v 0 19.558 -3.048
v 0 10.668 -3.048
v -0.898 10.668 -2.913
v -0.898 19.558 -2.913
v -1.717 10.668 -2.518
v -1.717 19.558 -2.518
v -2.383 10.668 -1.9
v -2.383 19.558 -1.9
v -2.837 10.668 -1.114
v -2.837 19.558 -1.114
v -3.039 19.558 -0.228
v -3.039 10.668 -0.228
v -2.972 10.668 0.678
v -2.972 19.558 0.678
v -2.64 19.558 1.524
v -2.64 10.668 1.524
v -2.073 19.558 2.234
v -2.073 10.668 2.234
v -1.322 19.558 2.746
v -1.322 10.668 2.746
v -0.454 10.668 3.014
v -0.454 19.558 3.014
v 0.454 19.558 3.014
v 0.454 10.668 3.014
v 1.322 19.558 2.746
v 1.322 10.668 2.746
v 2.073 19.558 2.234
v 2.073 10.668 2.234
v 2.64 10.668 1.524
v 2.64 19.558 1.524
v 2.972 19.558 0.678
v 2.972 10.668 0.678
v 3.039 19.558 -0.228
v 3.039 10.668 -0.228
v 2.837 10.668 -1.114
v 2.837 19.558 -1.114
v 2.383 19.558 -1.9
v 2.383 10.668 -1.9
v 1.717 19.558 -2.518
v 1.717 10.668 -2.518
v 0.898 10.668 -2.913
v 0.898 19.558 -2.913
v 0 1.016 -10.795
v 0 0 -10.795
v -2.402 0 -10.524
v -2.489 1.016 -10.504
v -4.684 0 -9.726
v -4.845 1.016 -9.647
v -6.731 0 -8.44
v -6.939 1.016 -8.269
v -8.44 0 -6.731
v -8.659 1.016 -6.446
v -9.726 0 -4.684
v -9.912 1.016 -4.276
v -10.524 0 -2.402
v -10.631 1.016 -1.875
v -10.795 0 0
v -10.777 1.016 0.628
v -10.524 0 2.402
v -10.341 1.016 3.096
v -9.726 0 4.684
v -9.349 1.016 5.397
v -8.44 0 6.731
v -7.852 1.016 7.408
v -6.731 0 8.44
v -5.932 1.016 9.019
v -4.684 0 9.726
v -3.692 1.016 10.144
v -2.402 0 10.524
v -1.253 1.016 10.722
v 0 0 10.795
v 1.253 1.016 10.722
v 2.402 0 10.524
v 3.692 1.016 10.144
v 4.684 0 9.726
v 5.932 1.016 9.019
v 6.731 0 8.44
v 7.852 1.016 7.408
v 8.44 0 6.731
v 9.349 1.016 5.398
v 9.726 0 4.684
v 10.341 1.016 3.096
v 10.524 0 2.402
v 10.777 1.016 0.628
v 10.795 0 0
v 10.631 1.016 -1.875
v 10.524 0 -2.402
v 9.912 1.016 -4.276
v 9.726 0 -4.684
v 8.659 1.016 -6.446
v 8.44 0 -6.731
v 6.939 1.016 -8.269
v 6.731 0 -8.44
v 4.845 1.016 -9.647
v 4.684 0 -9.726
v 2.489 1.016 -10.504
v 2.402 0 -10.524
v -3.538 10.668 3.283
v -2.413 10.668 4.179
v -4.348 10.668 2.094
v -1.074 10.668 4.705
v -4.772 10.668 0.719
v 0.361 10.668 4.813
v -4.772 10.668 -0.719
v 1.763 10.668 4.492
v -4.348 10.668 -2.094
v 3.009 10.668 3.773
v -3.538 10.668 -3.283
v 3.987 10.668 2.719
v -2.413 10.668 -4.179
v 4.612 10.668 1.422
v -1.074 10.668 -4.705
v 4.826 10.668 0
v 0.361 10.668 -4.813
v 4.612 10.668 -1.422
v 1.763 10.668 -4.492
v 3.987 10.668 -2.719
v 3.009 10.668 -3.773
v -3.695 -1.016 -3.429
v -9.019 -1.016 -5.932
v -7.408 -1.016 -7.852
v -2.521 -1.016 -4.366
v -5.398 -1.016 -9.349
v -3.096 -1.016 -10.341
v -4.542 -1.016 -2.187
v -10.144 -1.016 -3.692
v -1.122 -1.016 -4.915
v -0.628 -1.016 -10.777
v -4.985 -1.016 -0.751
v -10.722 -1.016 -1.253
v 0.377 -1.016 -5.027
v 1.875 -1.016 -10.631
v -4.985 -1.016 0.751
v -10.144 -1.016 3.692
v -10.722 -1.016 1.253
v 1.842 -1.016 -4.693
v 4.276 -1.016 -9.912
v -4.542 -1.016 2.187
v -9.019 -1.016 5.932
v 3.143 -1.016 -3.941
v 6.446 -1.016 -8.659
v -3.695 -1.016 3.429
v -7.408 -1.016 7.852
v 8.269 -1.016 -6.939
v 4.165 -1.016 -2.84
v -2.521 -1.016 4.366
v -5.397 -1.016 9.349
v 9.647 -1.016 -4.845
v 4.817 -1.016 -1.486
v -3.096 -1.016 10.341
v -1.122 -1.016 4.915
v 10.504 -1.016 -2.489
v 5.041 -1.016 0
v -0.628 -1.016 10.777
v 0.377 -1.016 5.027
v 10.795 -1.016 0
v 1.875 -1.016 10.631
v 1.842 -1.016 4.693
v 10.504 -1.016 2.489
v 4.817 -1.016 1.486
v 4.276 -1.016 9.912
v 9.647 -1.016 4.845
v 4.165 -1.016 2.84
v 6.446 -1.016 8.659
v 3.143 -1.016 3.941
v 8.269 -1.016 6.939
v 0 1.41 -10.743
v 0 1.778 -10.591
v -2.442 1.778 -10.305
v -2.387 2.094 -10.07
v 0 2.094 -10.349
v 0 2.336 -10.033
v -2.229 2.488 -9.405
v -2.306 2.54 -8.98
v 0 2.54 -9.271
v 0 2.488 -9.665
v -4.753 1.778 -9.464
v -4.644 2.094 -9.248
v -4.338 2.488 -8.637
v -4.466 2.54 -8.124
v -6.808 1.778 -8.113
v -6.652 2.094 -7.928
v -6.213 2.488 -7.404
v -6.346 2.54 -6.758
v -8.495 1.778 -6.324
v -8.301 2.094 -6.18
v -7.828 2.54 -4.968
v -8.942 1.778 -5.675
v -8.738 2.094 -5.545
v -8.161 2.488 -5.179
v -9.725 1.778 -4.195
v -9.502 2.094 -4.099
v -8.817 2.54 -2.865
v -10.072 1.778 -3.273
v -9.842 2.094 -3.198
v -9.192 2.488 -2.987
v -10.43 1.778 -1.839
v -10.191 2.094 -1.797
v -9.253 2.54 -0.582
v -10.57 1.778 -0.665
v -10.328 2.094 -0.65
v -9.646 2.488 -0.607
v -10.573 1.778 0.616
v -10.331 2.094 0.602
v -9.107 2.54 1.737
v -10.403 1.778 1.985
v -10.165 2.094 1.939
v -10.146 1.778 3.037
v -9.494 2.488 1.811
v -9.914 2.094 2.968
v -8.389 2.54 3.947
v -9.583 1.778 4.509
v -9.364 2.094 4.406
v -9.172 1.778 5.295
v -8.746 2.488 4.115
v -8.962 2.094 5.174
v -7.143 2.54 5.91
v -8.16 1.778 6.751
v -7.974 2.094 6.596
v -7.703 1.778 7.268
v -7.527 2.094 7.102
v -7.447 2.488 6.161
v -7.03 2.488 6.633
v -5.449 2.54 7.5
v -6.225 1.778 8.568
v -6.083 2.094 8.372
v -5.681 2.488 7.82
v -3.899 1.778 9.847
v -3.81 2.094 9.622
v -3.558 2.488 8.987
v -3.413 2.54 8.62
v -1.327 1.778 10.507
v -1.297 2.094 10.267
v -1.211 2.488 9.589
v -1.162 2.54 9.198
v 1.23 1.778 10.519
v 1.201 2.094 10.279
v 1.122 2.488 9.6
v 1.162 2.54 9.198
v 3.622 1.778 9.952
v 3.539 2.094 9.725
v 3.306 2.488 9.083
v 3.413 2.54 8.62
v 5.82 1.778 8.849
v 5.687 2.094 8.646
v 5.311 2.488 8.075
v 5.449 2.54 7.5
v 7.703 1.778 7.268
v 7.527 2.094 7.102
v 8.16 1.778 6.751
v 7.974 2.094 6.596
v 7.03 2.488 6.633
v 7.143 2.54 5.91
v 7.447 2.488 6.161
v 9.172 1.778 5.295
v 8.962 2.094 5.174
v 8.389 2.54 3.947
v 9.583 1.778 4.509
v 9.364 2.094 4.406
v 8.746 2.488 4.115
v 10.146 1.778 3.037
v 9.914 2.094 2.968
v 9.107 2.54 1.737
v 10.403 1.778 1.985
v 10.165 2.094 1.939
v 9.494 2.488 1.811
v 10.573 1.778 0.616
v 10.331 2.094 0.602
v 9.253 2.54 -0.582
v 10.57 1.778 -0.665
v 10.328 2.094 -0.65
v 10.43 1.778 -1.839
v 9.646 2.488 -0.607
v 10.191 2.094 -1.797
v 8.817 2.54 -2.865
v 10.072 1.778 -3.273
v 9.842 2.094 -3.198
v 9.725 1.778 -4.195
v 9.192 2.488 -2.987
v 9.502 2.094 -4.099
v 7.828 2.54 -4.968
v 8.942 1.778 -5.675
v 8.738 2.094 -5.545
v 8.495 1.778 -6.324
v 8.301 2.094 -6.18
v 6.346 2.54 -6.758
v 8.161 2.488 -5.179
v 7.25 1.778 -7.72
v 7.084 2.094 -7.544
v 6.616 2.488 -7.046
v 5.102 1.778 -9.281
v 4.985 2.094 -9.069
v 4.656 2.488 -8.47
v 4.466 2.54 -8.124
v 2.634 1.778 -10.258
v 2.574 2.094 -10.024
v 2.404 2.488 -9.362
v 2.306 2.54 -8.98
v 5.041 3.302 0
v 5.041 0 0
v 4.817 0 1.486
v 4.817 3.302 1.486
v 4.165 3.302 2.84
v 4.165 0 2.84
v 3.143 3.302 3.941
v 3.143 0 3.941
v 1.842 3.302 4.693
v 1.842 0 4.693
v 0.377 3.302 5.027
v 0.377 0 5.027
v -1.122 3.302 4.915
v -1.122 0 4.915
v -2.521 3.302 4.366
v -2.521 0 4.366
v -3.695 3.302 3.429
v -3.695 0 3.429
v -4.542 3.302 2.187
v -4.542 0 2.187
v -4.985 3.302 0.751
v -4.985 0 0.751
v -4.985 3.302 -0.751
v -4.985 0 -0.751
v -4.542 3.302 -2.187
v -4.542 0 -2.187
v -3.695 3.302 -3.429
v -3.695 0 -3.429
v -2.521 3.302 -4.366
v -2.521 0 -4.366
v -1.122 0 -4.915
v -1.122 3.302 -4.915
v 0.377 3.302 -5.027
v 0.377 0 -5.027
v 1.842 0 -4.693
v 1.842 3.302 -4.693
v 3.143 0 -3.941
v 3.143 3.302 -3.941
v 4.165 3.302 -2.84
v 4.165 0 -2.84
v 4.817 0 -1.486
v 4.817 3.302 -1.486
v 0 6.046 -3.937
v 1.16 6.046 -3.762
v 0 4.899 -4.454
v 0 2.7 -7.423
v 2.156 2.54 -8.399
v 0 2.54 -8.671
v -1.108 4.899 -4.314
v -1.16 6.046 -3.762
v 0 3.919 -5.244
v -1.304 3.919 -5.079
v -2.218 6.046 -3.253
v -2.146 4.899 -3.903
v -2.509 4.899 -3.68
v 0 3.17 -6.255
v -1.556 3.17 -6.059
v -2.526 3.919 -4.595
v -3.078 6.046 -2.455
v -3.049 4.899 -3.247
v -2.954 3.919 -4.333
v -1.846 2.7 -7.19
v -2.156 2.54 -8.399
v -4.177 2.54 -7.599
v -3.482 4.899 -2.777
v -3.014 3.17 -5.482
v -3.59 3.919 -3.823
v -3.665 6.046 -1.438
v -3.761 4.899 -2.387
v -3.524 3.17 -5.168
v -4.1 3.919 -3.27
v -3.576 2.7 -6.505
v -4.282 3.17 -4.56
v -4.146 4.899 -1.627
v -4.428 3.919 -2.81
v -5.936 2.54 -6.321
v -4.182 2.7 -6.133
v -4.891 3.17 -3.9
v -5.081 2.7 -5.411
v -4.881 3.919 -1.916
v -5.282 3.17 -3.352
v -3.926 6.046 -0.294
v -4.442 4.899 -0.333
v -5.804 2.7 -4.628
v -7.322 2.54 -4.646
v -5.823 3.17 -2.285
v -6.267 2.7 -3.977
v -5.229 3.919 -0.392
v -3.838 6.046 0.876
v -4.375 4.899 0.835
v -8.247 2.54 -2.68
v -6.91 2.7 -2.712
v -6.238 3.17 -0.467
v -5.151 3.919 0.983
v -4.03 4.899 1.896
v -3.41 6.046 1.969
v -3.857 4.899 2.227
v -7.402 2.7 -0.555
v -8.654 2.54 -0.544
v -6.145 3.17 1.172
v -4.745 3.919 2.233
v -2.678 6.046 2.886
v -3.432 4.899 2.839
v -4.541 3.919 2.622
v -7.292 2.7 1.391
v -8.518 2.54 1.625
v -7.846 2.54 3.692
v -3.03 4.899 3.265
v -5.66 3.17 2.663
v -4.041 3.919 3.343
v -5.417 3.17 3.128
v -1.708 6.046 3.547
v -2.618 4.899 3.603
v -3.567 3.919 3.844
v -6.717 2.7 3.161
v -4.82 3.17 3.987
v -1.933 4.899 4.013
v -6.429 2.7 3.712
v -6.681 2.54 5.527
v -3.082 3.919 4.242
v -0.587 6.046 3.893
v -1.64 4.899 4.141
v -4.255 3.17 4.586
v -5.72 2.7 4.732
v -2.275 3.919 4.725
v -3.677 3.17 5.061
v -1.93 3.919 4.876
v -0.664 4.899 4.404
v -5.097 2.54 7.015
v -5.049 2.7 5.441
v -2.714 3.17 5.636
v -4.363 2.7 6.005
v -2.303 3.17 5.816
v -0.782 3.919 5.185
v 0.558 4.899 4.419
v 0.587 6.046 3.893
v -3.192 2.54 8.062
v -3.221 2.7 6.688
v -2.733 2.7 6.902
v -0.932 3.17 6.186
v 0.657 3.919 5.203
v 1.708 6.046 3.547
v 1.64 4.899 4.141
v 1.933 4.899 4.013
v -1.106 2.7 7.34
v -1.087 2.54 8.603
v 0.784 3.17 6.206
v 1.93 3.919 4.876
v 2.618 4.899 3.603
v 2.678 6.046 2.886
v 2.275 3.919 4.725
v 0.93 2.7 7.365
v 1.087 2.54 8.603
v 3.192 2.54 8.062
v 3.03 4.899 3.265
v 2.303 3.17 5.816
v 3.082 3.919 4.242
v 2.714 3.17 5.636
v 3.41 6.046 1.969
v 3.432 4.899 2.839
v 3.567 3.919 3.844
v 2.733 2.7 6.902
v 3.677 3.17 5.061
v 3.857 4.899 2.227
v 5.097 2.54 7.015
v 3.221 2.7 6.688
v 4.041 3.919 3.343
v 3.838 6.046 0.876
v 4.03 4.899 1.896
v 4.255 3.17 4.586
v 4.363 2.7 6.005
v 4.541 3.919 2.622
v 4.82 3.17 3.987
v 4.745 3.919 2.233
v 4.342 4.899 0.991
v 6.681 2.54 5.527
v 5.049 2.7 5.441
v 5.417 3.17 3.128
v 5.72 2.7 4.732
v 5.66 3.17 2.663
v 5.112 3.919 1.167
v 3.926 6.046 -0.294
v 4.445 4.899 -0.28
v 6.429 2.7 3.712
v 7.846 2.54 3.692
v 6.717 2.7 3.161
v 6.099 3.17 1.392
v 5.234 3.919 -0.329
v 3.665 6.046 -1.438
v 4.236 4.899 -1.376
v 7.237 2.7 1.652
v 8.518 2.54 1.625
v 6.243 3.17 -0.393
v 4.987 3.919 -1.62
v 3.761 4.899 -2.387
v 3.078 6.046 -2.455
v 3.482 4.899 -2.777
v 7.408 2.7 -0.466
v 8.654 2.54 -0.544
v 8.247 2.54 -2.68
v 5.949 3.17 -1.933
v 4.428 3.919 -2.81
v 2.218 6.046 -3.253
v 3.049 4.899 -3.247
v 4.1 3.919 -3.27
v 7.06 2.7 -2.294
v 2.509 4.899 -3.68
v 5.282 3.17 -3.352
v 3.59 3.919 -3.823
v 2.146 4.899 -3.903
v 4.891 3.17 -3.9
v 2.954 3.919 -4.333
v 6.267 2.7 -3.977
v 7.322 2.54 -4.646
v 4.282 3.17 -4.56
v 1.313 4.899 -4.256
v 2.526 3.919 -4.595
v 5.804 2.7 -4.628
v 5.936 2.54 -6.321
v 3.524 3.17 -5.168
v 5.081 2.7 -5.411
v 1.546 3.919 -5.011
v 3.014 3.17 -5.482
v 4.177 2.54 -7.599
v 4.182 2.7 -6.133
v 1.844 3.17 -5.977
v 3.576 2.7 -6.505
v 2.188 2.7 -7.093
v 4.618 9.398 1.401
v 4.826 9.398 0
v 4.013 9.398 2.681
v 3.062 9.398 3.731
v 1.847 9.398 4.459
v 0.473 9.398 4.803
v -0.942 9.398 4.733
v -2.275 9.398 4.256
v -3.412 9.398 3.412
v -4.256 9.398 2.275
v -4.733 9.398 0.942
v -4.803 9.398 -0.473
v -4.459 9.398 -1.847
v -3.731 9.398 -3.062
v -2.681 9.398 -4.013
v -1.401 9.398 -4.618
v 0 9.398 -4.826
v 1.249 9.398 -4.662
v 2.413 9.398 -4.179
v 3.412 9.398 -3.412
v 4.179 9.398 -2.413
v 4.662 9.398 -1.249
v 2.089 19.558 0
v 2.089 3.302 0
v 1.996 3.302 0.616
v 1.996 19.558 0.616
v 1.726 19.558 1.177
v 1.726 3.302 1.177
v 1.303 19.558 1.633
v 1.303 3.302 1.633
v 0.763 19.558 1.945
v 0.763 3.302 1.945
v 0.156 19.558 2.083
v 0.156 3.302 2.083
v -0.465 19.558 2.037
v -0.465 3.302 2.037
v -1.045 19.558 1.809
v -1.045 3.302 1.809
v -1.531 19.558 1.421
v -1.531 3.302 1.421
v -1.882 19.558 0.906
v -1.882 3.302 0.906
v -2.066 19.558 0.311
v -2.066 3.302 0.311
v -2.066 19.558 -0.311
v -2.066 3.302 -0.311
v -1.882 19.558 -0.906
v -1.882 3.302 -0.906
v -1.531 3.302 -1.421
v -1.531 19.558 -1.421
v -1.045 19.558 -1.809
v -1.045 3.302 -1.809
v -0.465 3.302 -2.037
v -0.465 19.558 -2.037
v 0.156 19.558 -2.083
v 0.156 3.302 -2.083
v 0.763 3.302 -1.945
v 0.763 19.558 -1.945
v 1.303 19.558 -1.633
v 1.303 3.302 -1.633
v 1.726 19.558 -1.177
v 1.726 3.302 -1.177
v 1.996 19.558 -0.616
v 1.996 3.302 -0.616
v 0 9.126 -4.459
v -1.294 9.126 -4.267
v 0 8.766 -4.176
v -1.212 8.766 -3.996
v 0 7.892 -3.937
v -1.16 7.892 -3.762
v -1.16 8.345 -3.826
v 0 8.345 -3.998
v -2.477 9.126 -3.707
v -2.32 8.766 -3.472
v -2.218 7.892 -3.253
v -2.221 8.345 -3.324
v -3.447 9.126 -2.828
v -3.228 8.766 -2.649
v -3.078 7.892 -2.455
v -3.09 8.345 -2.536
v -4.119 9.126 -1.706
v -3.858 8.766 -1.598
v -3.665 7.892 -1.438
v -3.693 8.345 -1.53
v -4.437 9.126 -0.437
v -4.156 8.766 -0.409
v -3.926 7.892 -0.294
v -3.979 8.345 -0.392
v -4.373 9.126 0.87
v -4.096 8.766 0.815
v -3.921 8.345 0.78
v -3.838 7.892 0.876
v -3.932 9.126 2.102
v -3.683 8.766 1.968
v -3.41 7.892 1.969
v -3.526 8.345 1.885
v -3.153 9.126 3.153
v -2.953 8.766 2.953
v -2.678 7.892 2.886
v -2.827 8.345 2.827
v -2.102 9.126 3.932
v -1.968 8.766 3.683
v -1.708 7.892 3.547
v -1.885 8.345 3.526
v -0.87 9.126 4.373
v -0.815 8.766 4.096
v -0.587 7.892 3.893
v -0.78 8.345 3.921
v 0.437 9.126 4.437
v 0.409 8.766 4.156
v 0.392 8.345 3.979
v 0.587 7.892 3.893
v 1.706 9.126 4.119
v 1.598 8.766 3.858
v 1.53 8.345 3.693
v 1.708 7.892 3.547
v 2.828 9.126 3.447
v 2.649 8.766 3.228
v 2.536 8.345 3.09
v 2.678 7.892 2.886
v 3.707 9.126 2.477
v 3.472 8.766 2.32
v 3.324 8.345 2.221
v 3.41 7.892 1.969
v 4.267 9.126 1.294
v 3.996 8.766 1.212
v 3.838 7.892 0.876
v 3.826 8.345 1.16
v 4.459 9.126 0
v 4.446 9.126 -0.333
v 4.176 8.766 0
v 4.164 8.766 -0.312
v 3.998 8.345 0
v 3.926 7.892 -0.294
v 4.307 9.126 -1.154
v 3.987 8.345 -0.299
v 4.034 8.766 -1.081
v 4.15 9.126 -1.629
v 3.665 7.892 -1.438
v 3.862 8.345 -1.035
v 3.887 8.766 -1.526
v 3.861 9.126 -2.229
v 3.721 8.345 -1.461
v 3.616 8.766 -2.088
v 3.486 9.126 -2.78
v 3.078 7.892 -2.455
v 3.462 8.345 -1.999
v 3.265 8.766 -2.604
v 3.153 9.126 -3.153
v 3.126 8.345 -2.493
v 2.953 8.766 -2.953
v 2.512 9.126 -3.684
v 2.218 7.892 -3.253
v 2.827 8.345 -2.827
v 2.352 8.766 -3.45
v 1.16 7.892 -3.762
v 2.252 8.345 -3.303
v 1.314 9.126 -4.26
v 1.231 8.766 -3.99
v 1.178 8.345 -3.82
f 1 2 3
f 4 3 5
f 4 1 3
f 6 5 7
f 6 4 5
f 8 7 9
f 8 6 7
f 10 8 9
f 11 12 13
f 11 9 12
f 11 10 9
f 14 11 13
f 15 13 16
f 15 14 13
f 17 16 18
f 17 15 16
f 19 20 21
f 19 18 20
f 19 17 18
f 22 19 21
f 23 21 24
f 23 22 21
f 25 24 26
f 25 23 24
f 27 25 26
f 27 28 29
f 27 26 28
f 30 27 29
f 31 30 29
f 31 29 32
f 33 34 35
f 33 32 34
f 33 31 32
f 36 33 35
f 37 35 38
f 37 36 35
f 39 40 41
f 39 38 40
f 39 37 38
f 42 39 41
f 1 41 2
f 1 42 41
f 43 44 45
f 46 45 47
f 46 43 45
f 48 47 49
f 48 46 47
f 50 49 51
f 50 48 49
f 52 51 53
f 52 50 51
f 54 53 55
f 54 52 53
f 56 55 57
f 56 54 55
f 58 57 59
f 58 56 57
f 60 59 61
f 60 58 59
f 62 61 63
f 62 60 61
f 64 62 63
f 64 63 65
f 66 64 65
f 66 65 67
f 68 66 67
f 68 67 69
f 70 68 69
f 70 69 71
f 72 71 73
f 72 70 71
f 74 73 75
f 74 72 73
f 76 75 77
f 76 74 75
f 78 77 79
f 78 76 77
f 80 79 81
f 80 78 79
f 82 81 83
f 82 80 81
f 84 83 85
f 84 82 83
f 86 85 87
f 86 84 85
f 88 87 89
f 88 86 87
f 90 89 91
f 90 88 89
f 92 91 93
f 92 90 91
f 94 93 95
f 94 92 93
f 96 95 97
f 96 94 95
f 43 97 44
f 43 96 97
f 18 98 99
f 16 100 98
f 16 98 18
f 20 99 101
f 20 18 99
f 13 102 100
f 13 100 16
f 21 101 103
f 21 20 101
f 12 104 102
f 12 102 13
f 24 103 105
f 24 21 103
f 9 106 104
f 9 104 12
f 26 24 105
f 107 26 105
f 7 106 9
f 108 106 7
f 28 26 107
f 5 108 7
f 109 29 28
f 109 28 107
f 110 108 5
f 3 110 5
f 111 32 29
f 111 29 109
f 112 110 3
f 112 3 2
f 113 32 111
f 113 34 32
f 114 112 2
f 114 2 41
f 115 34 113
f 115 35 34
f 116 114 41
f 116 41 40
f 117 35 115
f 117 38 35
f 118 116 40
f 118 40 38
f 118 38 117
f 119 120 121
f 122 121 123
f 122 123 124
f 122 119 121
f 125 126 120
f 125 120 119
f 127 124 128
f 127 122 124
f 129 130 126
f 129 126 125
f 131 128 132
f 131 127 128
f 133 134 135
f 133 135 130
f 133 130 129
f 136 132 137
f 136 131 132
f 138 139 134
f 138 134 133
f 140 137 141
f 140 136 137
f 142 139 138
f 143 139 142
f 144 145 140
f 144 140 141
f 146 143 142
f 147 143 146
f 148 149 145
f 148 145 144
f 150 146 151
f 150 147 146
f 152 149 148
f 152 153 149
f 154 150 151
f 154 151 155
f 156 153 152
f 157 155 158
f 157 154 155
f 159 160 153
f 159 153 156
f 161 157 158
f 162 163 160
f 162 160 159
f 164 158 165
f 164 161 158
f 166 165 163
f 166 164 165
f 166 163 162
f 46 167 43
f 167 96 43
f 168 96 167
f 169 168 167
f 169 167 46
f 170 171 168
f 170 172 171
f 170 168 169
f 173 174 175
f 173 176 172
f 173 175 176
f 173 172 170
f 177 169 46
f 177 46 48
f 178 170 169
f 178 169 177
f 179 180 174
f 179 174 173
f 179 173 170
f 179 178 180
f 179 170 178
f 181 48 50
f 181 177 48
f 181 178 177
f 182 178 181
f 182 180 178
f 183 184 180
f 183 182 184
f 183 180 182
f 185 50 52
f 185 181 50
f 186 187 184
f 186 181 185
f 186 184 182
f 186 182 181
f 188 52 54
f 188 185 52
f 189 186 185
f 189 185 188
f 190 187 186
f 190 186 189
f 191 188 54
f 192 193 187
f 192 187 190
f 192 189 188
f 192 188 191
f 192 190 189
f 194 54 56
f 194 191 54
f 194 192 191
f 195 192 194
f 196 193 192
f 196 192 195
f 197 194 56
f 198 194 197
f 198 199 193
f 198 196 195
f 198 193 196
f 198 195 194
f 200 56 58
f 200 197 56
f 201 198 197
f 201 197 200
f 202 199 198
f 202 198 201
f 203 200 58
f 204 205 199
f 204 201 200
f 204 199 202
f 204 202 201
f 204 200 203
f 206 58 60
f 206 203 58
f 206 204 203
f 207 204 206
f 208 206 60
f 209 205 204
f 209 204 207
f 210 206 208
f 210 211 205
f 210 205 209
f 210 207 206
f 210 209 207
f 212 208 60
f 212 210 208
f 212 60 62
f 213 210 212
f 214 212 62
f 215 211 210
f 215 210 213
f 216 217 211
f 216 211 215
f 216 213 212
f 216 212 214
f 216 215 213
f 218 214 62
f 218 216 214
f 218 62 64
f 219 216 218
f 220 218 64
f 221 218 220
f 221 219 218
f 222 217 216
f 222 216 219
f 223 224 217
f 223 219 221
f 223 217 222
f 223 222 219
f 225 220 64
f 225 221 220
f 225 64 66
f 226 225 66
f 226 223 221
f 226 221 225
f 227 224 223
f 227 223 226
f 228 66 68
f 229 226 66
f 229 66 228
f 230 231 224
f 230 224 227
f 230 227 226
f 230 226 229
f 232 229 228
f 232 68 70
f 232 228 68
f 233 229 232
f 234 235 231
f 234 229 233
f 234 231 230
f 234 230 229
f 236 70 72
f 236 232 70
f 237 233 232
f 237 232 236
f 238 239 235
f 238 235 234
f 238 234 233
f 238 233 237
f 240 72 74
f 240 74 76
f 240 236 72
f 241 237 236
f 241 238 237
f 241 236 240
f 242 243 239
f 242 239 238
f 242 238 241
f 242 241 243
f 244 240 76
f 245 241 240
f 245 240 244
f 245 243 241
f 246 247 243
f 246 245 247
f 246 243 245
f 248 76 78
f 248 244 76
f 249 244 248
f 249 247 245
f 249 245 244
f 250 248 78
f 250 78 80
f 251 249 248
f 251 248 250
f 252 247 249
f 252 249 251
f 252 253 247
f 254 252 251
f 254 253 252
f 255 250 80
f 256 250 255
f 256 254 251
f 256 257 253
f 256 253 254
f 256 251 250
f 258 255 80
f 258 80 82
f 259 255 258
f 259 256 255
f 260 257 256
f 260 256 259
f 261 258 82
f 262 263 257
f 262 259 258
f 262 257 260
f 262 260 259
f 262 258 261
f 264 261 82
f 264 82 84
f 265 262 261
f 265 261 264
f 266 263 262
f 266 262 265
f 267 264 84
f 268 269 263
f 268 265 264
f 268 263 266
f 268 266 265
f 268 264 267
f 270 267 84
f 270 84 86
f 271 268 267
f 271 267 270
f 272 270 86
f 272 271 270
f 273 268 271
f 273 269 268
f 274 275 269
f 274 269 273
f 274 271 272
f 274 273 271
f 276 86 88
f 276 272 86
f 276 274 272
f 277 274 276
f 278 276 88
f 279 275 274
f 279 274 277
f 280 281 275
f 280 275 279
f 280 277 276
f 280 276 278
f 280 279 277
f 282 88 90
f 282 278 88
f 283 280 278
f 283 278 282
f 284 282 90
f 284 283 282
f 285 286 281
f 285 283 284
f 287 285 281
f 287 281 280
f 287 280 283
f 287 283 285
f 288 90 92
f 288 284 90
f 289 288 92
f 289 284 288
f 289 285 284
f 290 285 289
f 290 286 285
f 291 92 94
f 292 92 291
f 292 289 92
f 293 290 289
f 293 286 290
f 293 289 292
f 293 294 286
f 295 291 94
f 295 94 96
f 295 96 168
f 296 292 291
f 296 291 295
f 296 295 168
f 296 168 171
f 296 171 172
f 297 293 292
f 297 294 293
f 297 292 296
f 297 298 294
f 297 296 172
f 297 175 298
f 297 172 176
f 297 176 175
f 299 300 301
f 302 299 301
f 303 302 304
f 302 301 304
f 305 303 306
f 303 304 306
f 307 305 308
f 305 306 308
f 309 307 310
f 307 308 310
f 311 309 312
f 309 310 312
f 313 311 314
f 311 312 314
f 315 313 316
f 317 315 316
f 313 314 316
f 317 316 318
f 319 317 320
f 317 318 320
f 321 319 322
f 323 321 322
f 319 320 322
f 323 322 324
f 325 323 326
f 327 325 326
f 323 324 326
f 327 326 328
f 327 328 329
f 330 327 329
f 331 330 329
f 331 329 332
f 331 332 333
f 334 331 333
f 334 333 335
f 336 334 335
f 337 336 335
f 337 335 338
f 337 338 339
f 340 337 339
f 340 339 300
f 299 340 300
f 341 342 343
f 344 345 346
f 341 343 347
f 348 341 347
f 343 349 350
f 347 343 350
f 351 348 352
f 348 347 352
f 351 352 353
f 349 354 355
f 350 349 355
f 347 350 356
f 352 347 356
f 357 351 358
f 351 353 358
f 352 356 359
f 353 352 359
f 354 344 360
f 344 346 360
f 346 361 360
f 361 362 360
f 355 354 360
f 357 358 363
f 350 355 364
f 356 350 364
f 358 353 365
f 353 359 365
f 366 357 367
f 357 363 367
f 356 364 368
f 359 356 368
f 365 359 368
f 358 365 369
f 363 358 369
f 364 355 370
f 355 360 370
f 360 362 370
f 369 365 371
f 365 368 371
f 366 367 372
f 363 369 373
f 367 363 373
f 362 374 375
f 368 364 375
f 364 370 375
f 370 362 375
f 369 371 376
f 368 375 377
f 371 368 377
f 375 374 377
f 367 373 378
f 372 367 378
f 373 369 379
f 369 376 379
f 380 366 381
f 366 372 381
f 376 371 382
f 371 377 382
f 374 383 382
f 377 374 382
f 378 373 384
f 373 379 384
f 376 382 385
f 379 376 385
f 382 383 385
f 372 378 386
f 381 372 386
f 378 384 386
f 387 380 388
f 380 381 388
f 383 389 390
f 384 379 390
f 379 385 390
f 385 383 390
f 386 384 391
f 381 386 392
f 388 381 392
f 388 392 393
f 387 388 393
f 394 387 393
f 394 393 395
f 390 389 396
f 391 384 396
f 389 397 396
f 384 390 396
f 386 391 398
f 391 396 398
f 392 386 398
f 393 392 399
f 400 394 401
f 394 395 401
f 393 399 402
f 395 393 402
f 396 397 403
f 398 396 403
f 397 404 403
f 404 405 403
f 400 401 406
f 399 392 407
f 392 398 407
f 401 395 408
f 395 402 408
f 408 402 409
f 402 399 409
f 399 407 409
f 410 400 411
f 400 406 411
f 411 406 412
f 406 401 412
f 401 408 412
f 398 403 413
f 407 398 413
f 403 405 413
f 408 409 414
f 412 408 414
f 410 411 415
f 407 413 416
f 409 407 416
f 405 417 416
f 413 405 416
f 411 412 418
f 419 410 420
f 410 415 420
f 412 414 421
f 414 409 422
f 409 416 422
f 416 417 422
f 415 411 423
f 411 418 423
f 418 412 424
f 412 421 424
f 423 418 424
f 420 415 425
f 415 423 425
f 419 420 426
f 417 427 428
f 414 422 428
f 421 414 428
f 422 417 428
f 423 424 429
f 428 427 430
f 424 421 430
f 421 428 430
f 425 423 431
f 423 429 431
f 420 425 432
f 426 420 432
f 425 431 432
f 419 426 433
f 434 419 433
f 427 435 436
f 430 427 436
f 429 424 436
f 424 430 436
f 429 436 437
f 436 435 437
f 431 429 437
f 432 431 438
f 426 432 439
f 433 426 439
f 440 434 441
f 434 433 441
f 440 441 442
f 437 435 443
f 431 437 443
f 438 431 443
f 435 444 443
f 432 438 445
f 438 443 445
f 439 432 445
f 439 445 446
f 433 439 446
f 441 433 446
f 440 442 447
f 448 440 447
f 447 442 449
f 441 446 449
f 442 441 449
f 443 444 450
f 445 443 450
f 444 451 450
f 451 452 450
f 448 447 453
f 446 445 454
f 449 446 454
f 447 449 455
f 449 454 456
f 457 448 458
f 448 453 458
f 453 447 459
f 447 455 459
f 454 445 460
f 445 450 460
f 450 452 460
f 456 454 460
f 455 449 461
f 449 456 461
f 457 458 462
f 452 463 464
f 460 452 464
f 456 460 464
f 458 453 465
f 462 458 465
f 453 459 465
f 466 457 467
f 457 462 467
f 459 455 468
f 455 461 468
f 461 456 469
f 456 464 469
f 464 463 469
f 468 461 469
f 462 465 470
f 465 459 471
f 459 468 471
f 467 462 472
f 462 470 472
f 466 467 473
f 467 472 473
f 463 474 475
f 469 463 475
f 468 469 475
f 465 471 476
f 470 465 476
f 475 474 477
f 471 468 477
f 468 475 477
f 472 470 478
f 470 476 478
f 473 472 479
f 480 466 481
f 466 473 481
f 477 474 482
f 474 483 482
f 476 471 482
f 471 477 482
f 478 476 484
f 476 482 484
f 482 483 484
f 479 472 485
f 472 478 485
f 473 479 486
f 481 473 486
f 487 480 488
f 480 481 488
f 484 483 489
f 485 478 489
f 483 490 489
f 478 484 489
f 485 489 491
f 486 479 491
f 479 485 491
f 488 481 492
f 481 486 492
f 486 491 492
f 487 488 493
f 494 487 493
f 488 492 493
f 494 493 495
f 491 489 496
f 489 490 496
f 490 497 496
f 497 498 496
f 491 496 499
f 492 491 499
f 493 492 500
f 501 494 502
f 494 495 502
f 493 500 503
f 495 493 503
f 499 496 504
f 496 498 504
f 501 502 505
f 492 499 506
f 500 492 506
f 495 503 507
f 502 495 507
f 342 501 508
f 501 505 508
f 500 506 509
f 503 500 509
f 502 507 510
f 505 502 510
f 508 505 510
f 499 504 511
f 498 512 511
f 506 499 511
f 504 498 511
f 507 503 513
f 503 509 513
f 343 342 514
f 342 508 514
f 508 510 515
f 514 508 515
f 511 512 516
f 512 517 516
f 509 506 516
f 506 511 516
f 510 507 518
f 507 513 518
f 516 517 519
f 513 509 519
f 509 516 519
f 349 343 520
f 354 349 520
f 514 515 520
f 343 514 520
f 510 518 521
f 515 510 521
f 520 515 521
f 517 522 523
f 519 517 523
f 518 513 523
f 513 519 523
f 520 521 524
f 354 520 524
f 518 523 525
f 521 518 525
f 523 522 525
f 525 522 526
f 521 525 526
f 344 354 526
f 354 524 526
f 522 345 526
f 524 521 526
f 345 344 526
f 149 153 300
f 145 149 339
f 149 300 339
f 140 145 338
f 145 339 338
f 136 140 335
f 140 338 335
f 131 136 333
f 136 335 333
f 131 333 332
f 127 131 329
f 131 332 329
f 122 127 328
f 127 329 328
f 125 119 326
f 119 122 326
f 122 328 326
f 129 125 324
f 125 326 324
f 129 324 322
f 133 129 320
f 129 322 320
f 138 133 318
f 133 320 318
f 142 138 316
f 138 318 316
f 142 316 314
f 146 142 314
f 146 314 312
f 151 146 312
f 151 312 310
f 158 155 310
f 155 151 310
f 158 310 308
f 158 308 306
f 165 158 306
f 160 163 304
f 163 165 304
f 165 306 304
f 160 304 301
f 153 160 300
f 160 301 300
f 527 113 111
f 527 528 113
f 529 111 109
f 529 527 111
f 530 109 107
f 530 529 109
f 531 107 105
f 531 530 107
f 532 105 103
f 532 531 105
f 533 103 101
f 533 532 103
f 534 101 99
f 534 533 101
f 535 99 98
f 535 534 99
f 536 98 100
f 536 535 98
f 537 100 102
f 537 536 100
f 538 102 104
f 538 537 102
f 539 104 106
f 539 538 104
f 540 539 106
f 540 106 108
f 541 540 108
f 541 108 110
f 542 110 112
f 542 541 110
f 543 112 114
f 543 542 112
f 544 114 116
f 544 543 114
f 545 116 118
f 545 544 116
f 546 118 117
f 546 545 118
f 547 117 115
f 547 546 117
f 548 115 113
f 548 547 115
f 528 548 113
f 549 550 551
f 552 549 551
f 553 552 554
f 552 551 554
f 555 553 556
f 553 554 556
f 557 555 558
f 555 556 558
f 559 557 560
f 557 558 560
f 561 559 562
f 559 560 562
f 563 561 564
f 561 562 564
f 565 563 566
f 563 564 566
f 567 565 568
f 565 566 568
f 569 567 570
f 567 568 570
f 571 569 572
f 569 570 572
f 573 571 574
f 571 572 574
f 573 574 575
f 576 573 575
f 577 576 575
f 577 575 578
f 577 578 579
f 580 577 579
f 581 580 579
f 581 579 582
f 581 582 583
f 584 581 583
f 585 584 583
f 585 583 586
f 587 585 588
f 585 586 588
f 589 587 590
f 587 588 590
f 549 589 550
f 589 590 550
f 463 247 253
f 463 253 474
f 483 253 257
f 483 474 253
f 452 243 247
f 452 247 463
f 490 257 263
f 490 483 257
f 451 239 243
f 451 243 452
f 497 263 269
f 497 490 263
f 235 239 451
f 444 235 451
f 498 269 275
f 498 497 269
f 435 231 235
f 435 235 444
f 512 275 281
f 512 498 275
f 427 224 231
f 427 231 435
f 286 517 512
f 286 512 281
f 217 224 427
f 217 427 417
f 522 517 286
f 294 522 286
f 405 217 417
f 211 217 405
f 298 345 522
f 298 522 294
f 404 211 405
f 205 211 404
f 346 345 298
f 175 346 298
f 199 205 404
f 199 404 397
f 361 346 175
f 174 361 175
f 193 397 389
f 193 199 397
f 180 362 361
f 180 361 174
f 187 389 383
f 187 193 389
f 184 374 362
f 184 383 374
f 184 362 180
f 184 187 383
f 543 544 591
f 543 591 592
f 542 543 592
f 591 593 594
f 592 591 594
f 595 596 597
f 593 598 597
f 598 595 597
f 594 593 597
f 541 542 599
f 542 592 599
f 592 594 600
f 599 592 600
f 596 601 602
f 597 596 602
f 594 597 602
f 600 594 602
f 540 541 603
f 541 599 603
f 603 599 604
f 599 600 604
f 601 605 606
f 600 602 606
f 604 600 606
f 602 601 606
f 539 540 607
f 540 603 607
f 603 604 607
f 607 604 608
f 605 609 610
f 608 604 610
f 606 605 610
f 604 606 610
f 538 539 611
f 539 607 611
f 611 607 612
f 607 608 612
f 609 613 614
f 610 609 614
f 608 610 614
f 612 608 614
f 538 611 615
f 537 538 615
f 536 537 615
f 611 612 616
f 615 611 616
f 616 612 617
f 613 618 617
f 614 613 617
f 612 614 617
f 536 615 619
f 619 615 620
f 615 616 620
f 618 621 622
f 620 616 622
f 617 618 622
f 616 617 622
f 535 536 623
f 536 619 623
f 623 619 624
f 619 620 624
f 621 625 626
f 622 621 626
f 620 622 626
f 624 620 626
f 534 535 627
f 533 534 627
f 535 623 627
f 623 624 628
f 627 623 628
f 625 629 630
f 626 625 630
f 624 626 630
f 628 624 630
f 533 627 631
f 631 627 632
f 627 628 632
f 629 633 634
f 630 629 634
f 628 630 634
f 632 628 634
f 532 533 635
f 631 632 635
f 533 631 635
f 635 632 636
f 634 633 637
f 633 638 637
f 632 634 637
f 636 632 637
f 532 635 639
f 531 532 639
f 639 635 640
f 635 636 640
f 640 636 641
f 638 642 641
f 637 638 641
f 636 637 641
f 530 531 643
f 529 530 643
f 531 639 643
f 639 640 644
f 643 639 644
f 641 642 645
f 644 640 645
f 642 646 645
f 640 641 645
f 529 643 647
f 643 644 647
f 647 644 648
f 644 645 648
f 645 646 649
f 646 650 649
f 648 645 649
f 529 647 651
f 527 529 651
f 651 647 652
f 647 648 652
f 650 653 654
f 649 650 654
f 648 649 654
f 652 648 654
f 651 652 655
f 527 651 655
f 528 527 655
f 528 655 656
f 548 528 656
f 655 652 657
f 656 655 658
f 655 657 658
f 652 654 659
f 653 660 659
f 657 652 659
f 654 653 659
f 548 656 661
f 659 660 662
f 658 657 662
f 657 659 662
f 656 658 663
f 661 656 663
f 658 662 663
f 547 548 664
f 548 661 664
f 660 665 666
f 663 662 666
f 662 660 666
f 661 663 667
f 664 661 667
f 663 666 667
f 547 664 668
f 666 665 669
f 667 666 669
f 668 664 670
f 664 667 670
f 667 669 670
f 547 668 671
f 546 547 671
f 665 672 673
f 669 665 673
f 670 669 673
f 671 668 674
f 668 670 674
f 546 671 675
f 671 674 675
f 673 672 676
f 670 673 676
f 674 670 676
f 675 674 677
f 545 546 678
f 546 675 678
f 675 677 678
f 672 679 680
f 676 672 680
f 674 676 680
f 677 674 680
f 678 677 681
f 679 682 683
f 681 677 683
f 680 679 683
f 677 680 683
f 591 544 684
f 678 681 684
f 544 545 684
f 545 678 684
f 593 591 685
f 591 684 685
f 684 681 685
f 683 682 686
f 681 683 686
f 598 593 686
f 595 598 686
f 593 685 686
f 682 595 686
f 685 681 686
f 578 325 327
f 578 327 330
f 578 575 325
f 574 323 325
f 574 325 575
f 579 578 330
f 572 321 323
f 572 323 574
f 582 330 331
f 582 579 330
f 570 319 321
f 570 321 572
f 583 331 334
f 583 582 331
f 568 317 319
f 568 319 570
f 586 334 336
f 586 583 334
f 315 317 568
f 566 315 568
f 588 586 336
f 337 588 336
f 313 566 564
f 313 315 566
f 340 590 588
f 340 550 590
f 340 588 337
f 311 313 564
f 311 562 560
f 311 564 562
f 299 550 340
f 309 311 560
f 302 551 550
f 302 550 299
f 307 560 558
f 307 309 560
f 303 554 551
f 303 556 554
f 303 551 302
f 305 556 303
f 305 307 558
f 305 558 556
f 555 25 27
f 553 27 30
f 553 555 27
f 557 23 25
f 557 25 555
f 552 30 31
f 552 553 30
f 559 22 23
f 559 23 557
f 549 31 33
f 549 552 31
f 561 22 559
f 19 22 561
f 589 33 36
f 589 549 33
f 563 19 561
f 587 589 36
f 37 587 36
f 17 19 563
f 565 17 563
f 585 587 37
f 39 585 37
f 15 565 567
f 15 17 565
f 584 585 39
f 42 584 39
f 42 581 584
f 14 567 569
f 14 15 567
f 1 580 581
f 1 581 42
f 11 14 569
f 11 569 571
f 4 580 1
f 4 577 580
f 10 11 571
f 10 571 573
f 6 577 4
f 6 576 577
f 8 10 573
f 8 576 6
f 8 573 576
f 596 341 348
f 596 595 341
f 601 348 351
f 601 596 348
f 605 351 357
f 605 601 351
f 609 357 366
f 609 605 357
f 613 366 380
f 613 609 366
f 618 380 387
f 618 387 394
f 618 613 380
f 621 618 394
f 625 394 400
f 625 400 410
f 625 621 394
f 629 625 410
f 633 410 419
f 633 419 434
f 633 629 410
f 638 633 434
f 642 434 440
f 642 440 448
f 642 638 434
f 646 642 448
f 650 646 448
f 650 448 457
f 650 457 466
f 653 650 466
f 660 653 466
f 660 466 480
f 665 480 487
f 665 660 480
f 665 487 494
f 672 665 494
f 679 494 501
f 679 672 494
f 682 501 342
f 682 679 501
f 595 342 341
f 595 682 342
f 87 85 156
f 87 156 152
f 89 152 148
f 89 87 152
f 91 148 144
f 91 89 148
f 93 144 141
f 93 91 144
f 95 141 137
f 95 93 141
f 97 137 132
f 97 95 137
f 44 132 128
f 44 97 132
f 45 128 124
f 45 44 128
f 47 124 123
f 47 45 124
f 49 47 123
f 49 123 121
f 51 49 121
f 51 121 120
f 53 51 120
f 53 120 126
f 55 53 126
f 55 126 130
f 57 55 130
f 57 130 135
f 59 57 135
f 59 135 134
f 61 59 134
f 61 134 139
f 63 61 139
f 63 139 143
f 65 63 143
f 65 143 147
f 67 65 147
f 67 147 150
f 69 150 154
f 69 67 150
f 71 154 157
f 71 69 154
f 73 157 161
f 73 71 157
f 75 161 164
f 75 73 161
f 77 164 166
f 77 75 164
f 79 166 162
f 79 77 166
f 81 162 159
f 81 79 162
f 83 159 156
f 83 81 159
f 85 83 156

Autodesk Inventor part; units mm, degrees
ref_plane "YZ Plane" through (0, 0, 0) normal (1, 0, 0) x (0, 1, 0)
ref_plane "XZ Plane" through (0, 0, 0) normal (0, 1, 0) x (-1, 0, 0)
ref_plane "XY Plane" through (0, 0, 0) normal (0, 0, 1) x (1, 0, 0)
sketch "Sketch1" plane through (0, 0, 0) normal (1, 0, 0) x (0, 1, 0)
  line L0 (0, 0) -> (0, -10.795)
  line L1 (0, -10.795) -> (2.54, -10.795)
  line L2 (0, 0) -> (12.7, 0)
  line L3 (2.54, -10.795) -> (2.54, -9.9414)
  line L4 (2.54, -9.9414) -> (2.54, -8.6714)
  line L5 (14.986, -3.937) -> (1.8235, -3.937) construction
  arc A0 (6.0461, -3.937) -> (2.54, -8.6714) centre (7.4896, -8.6714) ccw
  line L6 (9.398, -3.048) -> (9.398, -4.826)
  line L7 (6.0461, -3.937) -> (7.8921, -3.937)
  arc A1 (9.398, -4.826) -> (7.8921, -3.937) centre (7.8921, -5.6569) ccw
  line L8 (19.558, 0) -> (0, 0)
  line L9 (9.398, -3.048) -> (19.558, -3.048)
  line L10 (19.558, -3.048) -> (19.558, 0)
  dimension "d0" = 10.795
  dimension "d1" = 2.54
  dimension "d2" = 12.7
  dimension "d5" = 3.937
  dimension "d6" = 1.27
  dimension "d7" = 4.9496
  dimension "d18" = 4.826
  dimension "d19" = 1.7199
  dimension "d24" = 9.398
  dimension "d25" = 10.16
  dimension "d26" = 3.048
  dimension "d27" = 4.572
  dimension "d28" = 5.6234
  dimension "d29" = 17.7345
revolve "Revolution1" add sketch "Sketch1" angle 360 about axis through (0, 0, 0) along (0, 1, 0)
sketch "Sketch2" plane through (0, 0, 0) normal (0, -1, 0) x (1, 0, 0)
  circle A0 centre (0, 0) radius 3.048 projected
  line L0 (4.95, -0.9536) -> (1.6491, -4.7636)
  line L1 (1.6491, -4.7636) -> (-3.3008, -3.81)
  line L2 (-3.3008, -3.81) -> (-4.95, 0.9536)
  line L3 (-4.95, 0.9536) -> (-1.6491, 4.7636)
  line L4 (-1.6491, 4.7636) -> (3.3008, 3.81)
  line L5 (3.3008, 3.81) -> (4.95, -0.9536)
  dimension "d11" = 8.7312
  dimension "d12" = 7.62
extrude "Extrusion1" cut sketch "Sketch2" against normal blind 3.302 contours A0 | L0 L1 L2 L3 L4 L5
sketch "Sketch3" plane through (0, 3.302, 0) normal (0, -1, 0) x (1, 0, 0)
  circle A0 centre (0, 0) radius 2.0892
  dimension "d15" = 4.1783
extrude "Extrusion2" cut sketch "Sketch3" against normal up to surface (16.256 mm away)
sketch "Sketch5" plane through (0, 9.398, 0) normal (0, 1, 0) x (1, 0, 0)
  circle A0 centre (0, 0) radius 4.826 projected
  circle A1 centre (0, 0) radius 3.048 projected
extrude "Extrusion5" add sketch "Sketch5" along normal blind 1.27
sketch "Sketch6" plane through (0, 0, 0) normal (0, -1, 0) x (1, 0, 0)
  circle A0 centre (0, 0) radius 3.048 projected
  line L0 (-4.95, 0.9536) -> (-1.6491, 4.7636) projected
  circle A1 centre (0, 0) radius 5.041
extrude "Extrusion6" cut sketch "Sketch6" against normal up to surface (3.302 mm away)
sketch "Sketch7" plane through (0, 0, 0) normal (0, -1, 0) x (1, 0, 0)
  circle A0 centre (0, 0) radius 5.041 projected
  circle A1 centre (0, 0) radius 10.795 projected
extrude "Extrusion7" add sketch "Sketch7" along normal blind 1.016
fillet "Fillet1" radius 1.524 1 edges at (0, 2.54, 10.795)
properties part number "_3DPrint"
